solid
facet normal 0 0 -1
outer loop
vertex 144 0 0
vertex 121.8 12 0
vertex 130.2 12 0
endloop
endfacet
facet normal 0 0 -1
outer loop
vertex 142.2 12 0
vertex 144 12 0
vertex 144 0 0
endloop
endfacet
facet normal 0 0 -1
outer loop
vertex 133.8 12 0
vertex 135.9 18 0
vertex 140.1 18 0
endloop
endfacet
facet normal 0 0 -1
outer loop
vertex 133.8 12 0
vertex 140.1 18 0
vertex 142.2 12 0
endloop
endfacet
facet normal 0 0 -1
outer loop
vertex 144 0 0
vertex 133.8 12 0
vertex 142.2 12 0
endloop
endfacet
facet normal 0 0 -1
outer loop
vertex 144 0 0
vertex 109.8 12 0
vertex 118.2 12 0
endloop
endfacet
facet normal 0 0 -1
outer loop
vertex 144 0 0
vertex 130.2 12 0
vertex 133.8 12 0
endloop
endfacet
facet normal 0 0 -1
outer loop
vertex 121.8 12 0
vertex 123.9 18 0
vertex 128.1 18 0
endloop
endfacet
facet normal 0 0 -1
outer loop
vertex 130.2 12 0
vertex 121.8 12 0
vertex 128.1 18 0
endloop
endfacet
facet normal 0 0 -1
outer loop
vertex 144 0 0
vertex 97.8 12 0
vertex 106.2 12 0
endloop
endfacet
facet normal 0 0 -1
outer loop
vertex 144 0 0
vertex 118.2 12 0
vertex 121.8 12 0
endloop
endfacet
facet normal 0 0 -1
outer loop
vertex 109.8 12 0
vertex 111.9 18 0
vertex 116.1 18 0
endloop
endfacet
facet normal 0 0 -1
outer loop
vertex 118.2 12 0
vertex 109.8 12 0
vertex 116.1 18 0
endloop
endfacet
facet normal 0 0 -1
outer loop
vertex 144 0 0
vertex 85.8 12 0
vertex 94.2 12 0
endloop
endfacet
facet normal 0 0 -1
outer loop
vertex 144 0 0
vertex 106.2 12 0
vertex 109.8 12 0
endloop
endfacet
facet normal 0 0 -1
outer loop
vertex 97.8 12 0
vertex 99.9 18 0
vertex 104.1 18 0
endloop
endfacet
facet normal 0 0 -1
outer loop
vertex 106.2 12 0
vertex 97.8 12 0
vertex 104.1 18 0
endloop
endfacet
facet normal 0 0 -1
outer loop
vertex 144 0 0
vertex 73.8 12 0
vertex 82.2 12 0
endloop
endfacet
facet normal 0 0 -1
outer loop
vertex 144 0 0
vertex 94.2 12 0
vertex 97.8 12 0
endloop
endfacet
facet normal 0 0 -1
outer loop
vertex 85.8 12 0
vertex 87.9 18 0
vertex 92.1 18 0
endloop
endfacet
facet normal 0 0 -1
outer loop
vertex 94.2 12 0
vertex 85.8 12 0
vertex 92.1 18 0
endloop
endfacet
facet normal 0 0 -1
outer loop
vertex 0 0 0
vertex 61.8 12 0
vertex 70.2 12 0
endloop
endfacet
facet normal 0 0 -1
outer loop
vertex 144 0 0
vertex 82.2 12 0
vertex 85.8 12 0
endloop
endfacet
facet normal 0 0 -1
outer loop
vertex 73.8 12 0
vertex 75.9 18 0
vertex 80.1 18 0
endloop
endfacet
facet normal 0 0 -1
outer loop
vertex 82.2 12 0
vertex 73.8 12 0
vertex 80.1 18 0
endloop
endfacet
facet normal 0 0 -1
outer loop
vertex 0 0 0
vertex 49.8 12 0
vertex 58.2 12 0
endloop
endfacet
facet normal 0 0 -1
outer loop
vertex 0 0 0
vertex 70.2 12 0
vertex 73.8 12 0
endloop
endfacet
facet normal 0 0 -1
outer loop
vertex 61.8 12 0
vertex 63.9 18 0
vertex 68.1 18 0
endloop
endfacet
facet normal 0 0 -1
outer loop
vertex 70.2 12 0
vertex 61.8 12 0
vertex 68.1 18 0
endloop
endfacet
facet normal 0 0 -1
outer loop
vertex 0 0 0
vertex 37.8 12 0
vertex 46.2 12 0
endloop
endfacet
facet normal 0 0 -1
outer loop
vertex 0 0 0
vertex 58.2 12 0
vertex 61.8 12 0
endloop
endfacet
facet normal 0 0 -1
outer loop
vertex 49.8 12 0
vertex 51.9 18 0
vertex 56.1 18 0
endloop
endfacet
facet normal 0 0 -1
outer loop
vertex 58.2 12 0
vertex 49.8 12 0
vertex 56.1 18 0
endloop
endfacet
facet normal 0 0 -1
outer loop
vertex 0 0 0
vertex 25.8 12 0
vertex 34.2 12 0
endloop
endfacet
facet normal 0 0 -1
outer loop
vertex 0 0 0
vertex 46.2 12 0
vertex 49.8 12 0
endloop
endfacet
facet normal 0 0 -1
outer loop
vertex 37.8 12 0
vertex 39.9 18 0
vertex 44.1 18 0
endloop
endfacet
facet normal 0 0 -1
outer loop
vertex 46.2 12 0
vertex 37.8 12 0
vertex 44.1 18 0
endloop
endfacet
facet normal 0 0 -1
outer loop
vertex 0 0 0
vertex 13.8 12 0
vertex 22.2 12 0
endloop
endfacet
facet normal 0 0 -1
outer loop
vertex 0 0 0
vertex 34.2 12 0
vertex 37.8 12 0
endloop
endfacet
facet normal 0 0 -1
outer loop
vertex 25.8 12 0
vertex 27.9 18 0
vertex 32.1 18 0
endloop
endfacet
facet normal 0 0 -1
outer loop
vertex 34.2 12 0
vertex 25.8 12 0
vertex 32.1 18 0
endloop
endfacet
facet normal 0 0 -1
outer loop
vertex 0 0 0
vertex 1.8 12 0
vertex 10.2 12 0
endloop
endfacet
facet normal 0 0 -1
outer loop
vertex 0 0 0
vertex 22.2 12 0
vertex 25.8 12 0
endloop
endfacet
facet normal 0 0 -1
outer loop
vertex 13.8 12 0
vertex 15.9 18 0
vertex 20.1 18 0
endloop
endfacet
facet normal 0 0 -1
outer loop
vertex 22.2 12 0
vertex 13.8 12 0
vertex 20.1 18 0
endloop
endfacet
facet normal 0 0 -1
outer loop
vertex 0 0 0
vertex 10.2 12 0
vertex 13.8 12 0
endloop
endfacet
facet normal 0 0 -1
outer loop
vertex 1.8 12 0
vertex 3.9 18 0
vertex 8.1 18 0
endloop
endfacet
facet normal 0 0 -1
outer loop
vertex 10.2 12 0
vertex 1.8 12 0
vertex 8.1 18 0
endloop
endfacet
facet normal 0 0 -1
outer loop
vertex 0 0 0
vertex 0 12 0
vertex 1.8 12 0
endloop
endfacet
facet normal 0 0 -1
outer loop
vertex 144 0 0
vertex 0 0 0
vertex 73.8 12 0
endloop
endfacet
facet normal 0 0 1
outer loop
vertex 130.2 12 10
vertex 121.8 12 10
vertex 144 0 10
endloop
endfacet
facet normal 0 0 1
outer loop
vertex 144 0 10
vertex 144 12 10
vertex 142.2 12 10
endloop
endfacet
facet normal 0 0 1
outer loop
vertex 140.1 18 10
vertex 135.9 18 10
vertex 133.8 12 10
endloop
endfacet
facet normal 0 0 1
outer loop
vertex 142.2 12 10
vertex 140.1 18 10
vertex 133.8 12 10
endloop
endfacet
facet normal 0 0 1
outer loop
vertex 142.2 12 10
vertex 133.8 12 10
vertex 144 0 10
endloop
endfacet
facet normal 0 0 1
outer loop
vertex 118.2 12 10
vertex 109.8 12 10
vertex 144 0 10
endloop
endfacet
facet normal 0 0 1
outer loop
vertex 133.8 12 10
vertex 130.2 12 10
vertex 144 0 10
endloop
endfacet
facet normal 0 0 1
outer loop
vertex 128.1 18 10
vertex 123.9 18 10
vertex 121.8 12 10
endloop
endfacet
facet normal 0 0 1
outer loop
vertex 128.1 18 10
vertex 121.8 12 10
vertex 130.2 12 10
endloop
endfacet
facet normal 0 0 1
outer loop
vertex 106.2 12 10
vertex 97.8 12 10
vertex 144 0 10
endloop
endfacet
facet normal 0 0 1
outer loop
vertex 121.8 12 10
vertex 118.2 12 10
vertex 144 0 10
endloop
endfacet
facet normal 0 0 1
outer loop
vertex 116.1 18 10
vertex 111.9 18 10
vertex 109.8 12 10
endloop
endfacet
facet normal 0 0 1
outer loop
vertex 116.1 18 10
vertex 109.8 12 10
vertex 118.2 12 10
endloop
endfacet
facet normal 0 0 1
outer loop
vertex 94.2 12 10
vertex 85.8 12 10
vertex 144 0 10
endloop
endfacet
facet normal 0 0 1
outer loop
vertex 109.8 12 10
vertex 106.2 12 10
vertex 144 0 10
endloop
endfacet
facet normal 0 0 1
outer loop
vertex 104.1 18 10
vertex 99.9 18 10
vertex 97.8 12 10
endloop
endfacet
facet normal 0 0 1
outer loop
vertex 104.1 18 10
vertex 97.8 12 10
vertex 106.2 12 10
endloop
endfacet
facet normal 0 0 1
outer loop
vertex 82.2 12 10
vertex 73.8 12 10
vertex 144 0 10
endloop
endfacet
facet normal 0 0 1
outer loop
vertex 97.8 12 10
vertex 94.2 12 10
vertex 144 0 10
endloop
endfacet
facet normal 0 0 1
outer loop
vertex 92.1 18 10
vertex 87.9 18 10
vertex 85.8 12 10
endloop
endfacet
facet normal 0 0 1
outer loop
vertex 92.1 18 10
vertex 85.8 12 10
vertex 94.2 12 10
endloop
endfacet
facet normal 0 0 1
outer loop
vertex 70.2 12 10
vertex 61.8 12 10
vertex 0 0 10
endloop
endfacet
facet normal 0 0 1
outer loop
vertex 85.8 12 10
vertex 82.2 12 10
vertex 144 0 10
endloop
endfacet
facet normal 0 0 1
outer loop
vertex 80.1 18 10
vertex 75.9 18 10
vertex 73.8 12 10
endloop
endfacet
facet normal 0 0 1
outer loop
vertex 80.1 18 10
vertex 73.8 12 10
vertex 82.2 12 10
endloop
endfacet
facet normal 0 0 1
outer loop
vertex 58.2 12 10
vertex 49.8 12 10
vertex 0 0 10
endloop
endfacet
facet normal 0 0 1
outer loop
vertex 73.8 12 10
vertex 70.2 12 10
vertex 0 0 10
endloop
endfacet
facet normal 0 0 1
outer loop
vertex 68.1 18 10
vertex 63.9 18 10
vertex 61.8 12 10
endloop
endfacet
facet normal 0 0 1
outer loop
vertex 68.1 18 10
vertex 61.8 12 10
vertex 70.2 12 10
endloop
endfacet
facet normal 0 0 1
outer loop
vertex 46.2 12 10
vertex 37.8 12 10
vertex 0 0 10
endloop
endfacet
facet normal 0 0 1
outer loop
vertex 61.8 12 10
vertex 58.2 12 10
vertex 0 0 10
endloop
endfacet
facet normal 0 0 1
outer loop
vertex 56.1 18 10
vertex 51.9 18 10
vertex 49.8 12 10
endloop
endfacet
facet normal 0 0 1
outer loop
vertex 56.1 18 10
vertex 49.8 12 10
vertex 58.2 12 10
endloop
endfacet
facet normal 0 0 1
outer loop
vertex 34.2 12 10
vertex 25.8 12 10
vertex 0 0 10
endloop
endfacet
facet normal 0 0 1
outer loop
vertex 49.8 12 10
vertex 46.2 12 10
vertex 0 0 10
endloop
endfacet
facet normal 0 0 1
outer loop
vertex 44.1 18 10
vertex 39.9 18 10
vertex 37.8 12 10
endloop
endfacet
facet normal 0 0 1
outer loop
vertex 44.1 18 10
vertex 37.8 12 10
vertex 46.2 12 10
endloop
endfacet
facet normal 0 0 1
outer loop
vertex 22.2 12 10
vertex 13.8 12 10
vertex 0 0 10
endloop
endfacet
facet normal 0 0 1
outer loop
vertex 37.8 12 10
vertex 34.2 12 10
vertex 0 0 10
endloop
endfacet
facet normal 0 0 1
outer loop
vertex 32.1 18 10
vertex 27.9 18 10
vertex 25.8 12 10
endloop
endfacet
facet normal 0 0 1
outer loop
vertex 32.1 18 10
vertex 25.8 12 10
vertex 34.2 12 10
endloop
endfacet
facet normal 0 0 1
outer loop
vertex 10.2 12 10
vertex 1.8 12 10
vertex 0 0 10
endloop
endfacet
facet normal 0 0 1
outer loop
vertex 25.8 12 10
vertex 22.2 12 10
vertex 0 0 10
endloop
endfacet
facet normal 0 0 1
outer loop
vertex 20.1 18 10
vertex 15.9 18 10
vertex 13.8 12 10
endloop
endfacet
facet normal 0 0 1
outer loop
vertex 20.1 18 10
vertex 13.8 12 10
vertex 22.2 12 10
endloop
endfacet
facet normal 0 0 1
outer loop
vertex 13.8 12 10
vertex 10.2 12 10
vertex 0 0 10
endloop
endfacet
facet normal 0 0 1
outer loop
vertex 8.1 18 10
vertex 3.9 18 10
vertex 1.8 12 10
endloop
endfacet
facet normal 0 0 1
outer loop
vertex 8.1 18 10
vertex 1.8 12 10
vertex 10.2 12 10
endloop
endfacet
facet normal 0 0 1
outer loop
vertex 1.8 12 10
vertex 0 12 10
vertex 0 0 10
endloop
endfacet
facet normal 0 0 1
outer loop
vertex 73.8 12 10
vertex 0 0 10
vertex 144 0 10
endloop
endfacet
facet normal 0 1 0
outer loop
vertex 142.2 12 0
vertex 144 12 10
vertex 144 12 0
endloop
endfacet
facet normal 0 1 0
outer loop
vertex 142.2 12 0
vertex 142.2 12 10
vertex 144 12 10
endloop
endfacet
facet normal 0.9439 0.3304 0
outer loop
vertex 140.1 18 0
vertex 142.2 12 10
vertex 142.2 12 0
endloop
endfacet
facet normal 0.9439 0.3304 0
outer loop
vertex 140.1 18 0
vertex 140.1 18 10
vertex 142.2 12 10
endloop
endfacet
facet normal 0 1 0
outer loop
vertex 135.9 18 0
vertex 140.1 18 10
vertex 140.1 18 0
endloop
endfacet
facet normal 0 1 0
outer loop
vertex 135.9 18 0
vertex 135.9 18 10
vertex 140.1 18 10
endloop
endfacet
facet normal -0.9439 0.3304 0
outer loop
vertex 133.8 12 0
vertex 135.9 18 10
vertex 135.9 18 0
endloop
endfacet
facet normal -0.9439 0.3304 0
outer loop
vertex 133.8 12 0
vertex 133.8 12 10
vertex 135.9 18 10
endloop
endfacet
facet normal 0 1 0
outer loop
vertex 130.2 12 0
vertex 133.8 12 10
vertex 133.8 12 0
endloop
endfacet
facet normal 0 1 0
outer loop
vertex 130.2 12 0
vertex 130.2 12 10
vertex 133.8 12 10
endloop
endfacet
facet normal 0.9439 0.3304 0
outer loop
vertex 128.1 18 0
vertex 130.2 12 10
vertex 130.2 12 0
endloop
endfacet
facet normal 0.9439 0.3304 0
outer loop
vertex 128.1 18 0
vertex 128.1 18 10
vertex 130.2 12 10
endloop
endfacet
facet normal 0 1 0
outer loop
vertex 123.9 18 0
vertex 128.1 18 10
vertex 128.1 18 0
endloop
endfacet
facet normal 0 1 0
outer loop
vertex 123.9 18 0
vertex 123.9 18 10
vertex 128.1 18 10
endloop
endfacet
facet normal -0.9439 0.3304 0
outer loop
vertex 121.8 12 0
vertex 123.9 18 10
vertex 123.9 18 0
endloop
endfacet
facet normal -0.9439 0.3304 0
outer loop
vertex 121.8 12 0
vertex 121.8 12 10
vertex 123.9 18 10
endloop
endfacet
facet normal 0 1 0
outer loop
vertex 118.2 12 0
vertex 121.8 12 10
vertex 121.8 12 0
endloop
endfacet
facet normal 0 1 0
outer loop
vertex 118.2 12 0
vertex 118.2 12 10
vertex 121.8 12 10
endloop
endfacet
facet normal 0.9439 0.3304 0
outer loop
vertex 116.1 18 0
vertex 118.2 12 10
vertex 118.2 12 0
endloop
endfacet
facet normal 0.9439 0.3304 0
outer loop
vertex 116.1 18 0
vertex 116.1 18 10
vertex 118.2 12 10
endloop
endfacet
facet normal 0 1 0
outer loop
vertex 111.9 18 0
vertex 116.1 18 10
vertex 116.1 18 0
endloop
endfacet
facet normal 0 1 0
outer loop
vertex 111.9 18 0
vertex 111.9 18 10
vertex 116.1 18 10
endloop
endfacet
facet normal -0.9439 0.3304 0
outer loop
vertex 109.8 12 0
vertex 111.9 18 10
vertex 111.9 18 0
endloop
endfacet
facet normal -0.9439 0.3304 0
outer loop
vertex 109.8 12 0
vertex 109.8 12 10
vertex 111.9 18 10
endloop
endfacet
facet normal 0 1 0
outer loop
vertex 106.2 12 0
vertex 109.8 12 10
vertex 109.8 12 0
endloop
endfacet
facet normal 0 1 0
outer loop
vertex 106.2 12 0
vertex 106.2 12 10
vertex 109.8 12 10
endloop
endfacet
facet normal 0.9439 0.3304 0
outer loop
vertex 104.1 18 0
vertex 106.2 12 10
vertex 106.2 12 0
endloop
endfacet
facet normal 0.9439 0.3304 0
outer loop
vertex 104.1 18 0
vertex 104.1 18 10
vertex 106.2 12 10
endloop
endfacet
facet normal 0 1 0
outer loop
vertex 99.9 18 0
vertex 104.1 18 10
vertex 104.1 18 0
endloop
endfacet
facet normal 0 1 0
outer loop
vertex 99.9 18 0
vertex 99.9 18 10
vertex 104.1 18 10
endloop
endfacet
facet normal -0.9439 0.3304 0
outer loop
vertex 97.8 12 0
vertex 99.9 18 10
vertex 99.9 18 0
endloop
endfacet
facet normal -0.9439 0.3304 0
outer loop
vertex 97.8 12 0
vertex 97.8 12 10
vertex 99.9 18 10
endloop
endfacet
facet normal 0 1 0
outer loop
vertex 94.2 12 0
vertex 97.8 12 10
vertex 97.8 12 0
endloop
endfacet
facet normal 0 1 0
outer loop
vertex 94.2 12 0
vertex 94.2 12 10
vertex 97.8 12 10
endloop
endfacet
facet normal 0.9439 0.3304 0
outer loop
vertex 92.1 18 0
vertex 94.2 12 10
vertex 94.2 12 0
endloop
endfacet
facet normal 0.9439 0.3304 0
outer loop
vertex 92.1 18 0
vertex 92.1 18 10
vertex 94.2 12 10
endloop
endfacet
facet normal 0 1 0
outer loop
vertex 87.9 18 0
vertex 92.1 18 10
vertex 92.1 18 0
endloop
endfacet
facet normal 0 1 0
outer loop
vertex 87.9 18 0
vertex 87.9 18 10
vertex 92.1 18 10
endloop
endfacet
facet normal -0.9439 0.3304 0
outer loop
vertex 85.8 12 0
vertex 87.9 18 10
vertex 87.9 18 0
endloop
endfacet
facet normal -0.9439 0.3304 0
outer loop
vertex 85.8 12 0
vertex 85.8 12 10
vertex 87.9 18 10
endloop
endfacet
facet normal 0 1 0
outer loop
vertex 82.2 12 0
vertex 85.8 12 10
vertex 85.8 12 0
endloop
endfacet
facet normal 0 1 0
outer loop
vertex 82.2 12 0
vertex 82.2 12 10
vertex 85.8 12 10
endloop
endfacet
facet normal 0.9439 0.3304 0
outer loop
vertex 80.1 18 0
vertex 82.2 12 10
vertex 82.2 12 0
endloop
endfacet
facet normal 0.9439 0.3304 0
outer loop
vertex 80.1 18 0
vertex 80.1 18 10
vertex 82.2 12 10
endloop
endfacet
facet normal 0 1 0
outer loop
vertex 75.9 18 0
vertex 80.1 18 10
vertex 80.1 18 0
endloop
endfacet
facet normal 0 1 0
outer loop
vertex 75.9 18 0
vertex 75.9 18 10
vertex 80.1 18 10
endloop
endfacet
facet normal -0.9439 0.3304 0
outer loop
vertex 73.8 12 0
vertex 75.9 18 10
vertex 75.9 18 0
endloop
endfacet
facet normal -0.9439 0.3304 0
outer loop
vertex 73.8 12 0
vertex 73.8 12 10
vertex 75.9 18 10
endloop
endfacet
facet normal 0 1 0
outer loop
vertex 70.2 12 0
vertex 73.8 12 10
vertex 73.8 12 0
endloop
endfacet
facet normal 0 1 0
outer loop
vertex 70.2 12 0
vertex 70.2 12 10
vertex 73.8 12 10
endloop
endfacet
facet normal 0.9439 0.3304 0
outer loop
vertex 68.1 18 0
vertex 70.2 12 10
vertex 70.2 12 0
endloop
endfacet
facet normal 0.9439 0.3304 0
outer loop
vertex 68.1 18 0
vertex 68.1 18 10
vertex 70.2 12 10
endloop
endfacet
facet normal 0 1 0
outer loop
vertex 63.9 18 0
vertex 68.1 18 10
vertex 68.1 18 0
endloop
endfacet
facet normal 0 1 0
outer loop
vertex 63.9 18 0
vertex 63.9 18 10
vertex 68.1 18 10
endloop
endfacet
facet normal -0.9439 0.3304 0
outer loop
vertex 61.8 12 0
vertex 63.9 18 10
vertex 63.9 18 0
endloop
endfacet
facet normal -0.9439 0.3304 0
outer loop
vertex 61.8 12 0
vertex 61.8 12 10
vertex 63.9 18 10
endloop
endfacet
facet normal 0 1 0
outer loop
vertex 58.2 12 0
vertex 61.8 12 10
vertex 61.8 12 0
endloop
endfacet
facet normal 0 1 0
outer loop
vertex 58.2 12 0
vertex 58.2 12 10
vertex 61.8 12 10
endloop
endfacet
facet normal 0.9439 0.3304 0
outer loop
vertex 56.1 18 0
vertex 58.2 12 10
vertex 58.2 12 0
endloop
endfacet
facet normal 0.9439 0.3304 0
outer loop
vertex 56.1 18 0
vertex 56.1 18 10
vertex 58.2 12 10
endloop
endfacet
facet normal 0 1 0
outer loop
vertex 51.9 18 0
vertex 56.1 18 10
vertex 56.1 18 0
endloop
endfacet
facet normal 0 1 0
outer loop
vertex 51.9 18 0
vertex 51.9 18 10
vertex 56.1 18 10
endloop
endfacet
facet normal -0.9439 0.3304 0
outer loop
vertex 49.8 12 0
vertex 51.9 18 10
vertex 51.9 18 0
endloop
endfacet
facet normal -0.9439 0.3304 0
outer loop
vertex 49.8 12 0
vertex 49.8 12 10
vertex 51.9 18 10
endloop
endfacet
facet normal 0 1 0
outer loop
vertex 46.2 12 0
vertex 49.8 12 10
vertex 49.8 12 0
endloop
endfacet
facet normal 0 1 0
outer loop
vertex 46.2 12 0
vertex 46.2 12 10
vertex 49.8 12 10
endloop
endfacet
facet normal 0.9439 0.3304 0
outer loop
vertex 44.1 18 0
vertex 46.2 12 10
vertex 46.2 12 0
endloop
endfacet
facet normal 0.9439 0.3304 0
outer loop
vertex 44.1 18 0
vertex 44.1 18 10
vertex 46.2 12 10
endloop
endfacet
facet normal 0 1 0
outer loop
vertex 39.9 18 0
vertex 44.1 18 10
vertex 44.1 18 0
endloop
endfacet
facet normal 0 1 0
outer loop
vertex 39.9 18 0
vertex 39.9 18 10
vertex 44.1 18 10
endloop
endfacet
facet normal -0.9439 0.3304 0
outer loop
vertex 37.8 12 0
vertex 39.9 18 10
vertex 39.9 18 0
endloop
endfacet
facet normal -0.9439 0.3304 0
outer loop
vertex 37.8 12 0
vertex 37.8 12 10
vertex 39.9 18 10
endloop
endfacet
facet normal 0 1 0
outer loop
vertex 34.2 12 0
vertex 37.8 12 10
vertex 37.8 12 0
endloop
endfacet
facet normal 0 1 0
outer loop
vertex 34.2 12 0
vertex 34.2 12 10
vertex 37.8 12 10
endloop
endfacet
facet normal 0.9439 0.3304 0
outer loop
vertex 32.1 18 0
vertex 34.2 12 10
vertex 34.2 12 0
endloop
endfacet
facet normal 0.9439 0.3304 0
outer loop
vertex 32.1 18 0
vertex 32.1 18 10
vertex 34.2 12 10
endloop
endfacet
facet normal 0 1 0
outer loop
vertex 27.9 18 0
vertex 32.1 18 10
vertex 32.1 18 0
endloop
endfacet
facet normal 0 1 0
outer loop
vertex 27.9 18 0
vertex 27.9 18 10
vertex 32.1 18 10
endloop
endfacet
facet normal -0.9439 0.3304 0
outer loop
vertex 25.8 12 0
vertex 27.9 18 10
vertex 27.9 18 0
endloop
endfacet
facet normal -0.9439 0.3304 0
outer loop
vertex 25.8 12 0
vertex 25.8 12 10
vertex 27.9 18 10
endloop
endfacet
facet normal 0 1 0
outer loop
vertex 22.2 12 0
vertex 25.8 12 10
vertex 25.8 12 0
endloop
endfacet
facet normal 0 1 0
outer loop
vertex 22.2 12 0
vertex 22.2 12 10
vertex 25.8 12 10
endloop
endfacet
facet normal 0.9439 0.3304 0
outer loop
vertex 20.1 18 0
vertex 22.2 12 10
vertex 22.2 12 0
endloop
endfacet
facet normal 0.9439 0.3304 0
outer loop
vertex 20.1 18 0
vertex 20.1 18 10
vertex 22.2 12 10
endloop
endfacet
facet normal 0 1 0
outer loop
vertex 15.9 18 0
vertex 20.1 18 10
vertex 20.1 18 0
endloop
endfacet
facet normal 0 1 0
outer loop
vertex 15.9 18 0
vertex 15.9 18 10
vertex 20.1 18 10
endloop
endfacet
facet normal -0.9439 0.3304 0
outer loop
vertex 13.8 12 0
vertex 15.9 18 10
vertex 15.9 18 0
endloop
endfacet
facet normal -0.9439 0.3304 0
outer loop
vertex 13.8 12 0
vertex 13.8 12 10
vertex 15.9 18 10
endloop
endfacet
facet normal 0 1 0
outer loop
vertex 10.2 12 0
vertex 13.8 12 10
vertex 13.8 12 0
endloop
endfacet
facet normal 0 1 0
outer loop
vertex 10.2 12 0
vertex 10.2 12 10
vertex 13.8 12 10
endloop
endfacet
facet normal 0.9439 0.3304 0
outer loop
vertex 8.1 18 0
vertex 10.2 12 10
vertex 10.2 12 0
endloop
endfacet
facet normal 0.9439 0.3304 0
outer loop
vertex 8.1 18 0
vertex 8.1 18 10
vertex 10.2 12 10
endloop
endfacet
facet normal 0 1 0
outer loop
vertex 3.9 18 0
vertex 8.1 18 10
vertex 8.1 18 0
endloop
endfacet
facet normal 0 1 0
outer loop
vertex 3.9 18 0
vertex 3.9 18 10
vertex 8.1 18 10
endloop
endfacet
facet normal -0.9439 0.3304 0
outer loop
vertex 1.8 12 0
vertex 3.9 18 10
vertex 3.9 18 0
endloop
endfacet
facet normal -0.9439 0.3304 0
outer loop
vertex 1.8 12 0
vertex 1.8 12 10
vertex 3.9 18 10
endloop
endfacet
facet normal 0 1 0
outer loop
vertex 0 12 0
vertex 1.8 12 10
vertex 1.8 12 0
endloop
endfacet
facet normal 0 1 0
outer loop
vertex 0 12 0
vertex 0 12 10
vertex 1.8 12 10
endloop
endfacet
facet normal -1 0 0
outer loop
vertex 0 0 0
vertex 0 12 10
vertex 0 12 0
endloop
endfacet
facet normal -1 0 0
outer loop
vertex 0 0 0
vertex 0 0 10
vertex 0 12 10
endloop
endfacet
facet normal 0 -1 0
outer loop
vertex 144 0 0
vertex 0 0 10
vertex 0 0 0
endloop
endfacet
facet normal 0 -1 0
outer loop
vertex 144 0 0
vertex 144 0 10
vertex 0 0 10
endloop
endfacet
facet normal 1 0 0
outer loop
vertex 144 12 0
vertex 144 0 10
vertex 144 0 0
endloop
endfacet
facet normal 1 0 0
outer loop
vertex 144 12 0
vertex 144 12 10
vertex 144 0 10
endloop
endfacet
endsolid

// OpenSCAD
$fn = 32;

// ----------------------------------------------------------------------
// Gear rack: 12 teeth, pitch 12 mm
// ----------------------------------------------------------------------

// --- parameters (mm) ---
teeth = 12;               // number of teeth
pitch = 12;               // tooth pitch, X
root_w = 8.4;             // tooth width at the root
tip_w = 4.2;              // tooth width at the tip
base_h = 12;              // rack body height, Y
tooth_h = 6;              // tooth height above the body
plate_t = 10;             // rack width, Z (extrusion height)

rack_l = teeth * pitch;  // overall length
total_h = base_h + tooth_h;  // overall height

profile = [[0, 0], [144, 0], [144, 12], [142.2, 12], [140.1, 18], [135.9, 18], [133.8, 12], [130.2, 12], [128.1, 18], [123.9, 18], [121.8, 12], [118.2, 12], [116.1, 18], [111.9, 18], [109.8, 12], [106.2, 12], [104.1, 18], [99.9, 18], [97.8, 12], [94.2, 12], [92.1, 18], [87.9, 18], [85.8, 12], [82.2, 12], [80.1, 18], [75.9, 18], [73.8, 12], [70.2, 12], [68.1, 18], [63.9, 18], [61.8, 12], [58.2, 12], [56.1, 18], [51.9, 18], [49.8, 12], [46.2, 12], [44.1, 18], [39.9, 18], [37.8, 12], [34.2, 12], [32.1, 18], [27.9, 18], [25.8, 12], [22.2, 12], [20.1, 18], [15.9, 18], [13.8, 12], [10.2, 12], [8.1, 18], [3.9, 18], [1.8, 12], [0, 12]];  // primary outline, 52 points, counter clockwise

// --- the one profile operation ---
linear_extrude(height = plate_t) polygon(points = profile);
